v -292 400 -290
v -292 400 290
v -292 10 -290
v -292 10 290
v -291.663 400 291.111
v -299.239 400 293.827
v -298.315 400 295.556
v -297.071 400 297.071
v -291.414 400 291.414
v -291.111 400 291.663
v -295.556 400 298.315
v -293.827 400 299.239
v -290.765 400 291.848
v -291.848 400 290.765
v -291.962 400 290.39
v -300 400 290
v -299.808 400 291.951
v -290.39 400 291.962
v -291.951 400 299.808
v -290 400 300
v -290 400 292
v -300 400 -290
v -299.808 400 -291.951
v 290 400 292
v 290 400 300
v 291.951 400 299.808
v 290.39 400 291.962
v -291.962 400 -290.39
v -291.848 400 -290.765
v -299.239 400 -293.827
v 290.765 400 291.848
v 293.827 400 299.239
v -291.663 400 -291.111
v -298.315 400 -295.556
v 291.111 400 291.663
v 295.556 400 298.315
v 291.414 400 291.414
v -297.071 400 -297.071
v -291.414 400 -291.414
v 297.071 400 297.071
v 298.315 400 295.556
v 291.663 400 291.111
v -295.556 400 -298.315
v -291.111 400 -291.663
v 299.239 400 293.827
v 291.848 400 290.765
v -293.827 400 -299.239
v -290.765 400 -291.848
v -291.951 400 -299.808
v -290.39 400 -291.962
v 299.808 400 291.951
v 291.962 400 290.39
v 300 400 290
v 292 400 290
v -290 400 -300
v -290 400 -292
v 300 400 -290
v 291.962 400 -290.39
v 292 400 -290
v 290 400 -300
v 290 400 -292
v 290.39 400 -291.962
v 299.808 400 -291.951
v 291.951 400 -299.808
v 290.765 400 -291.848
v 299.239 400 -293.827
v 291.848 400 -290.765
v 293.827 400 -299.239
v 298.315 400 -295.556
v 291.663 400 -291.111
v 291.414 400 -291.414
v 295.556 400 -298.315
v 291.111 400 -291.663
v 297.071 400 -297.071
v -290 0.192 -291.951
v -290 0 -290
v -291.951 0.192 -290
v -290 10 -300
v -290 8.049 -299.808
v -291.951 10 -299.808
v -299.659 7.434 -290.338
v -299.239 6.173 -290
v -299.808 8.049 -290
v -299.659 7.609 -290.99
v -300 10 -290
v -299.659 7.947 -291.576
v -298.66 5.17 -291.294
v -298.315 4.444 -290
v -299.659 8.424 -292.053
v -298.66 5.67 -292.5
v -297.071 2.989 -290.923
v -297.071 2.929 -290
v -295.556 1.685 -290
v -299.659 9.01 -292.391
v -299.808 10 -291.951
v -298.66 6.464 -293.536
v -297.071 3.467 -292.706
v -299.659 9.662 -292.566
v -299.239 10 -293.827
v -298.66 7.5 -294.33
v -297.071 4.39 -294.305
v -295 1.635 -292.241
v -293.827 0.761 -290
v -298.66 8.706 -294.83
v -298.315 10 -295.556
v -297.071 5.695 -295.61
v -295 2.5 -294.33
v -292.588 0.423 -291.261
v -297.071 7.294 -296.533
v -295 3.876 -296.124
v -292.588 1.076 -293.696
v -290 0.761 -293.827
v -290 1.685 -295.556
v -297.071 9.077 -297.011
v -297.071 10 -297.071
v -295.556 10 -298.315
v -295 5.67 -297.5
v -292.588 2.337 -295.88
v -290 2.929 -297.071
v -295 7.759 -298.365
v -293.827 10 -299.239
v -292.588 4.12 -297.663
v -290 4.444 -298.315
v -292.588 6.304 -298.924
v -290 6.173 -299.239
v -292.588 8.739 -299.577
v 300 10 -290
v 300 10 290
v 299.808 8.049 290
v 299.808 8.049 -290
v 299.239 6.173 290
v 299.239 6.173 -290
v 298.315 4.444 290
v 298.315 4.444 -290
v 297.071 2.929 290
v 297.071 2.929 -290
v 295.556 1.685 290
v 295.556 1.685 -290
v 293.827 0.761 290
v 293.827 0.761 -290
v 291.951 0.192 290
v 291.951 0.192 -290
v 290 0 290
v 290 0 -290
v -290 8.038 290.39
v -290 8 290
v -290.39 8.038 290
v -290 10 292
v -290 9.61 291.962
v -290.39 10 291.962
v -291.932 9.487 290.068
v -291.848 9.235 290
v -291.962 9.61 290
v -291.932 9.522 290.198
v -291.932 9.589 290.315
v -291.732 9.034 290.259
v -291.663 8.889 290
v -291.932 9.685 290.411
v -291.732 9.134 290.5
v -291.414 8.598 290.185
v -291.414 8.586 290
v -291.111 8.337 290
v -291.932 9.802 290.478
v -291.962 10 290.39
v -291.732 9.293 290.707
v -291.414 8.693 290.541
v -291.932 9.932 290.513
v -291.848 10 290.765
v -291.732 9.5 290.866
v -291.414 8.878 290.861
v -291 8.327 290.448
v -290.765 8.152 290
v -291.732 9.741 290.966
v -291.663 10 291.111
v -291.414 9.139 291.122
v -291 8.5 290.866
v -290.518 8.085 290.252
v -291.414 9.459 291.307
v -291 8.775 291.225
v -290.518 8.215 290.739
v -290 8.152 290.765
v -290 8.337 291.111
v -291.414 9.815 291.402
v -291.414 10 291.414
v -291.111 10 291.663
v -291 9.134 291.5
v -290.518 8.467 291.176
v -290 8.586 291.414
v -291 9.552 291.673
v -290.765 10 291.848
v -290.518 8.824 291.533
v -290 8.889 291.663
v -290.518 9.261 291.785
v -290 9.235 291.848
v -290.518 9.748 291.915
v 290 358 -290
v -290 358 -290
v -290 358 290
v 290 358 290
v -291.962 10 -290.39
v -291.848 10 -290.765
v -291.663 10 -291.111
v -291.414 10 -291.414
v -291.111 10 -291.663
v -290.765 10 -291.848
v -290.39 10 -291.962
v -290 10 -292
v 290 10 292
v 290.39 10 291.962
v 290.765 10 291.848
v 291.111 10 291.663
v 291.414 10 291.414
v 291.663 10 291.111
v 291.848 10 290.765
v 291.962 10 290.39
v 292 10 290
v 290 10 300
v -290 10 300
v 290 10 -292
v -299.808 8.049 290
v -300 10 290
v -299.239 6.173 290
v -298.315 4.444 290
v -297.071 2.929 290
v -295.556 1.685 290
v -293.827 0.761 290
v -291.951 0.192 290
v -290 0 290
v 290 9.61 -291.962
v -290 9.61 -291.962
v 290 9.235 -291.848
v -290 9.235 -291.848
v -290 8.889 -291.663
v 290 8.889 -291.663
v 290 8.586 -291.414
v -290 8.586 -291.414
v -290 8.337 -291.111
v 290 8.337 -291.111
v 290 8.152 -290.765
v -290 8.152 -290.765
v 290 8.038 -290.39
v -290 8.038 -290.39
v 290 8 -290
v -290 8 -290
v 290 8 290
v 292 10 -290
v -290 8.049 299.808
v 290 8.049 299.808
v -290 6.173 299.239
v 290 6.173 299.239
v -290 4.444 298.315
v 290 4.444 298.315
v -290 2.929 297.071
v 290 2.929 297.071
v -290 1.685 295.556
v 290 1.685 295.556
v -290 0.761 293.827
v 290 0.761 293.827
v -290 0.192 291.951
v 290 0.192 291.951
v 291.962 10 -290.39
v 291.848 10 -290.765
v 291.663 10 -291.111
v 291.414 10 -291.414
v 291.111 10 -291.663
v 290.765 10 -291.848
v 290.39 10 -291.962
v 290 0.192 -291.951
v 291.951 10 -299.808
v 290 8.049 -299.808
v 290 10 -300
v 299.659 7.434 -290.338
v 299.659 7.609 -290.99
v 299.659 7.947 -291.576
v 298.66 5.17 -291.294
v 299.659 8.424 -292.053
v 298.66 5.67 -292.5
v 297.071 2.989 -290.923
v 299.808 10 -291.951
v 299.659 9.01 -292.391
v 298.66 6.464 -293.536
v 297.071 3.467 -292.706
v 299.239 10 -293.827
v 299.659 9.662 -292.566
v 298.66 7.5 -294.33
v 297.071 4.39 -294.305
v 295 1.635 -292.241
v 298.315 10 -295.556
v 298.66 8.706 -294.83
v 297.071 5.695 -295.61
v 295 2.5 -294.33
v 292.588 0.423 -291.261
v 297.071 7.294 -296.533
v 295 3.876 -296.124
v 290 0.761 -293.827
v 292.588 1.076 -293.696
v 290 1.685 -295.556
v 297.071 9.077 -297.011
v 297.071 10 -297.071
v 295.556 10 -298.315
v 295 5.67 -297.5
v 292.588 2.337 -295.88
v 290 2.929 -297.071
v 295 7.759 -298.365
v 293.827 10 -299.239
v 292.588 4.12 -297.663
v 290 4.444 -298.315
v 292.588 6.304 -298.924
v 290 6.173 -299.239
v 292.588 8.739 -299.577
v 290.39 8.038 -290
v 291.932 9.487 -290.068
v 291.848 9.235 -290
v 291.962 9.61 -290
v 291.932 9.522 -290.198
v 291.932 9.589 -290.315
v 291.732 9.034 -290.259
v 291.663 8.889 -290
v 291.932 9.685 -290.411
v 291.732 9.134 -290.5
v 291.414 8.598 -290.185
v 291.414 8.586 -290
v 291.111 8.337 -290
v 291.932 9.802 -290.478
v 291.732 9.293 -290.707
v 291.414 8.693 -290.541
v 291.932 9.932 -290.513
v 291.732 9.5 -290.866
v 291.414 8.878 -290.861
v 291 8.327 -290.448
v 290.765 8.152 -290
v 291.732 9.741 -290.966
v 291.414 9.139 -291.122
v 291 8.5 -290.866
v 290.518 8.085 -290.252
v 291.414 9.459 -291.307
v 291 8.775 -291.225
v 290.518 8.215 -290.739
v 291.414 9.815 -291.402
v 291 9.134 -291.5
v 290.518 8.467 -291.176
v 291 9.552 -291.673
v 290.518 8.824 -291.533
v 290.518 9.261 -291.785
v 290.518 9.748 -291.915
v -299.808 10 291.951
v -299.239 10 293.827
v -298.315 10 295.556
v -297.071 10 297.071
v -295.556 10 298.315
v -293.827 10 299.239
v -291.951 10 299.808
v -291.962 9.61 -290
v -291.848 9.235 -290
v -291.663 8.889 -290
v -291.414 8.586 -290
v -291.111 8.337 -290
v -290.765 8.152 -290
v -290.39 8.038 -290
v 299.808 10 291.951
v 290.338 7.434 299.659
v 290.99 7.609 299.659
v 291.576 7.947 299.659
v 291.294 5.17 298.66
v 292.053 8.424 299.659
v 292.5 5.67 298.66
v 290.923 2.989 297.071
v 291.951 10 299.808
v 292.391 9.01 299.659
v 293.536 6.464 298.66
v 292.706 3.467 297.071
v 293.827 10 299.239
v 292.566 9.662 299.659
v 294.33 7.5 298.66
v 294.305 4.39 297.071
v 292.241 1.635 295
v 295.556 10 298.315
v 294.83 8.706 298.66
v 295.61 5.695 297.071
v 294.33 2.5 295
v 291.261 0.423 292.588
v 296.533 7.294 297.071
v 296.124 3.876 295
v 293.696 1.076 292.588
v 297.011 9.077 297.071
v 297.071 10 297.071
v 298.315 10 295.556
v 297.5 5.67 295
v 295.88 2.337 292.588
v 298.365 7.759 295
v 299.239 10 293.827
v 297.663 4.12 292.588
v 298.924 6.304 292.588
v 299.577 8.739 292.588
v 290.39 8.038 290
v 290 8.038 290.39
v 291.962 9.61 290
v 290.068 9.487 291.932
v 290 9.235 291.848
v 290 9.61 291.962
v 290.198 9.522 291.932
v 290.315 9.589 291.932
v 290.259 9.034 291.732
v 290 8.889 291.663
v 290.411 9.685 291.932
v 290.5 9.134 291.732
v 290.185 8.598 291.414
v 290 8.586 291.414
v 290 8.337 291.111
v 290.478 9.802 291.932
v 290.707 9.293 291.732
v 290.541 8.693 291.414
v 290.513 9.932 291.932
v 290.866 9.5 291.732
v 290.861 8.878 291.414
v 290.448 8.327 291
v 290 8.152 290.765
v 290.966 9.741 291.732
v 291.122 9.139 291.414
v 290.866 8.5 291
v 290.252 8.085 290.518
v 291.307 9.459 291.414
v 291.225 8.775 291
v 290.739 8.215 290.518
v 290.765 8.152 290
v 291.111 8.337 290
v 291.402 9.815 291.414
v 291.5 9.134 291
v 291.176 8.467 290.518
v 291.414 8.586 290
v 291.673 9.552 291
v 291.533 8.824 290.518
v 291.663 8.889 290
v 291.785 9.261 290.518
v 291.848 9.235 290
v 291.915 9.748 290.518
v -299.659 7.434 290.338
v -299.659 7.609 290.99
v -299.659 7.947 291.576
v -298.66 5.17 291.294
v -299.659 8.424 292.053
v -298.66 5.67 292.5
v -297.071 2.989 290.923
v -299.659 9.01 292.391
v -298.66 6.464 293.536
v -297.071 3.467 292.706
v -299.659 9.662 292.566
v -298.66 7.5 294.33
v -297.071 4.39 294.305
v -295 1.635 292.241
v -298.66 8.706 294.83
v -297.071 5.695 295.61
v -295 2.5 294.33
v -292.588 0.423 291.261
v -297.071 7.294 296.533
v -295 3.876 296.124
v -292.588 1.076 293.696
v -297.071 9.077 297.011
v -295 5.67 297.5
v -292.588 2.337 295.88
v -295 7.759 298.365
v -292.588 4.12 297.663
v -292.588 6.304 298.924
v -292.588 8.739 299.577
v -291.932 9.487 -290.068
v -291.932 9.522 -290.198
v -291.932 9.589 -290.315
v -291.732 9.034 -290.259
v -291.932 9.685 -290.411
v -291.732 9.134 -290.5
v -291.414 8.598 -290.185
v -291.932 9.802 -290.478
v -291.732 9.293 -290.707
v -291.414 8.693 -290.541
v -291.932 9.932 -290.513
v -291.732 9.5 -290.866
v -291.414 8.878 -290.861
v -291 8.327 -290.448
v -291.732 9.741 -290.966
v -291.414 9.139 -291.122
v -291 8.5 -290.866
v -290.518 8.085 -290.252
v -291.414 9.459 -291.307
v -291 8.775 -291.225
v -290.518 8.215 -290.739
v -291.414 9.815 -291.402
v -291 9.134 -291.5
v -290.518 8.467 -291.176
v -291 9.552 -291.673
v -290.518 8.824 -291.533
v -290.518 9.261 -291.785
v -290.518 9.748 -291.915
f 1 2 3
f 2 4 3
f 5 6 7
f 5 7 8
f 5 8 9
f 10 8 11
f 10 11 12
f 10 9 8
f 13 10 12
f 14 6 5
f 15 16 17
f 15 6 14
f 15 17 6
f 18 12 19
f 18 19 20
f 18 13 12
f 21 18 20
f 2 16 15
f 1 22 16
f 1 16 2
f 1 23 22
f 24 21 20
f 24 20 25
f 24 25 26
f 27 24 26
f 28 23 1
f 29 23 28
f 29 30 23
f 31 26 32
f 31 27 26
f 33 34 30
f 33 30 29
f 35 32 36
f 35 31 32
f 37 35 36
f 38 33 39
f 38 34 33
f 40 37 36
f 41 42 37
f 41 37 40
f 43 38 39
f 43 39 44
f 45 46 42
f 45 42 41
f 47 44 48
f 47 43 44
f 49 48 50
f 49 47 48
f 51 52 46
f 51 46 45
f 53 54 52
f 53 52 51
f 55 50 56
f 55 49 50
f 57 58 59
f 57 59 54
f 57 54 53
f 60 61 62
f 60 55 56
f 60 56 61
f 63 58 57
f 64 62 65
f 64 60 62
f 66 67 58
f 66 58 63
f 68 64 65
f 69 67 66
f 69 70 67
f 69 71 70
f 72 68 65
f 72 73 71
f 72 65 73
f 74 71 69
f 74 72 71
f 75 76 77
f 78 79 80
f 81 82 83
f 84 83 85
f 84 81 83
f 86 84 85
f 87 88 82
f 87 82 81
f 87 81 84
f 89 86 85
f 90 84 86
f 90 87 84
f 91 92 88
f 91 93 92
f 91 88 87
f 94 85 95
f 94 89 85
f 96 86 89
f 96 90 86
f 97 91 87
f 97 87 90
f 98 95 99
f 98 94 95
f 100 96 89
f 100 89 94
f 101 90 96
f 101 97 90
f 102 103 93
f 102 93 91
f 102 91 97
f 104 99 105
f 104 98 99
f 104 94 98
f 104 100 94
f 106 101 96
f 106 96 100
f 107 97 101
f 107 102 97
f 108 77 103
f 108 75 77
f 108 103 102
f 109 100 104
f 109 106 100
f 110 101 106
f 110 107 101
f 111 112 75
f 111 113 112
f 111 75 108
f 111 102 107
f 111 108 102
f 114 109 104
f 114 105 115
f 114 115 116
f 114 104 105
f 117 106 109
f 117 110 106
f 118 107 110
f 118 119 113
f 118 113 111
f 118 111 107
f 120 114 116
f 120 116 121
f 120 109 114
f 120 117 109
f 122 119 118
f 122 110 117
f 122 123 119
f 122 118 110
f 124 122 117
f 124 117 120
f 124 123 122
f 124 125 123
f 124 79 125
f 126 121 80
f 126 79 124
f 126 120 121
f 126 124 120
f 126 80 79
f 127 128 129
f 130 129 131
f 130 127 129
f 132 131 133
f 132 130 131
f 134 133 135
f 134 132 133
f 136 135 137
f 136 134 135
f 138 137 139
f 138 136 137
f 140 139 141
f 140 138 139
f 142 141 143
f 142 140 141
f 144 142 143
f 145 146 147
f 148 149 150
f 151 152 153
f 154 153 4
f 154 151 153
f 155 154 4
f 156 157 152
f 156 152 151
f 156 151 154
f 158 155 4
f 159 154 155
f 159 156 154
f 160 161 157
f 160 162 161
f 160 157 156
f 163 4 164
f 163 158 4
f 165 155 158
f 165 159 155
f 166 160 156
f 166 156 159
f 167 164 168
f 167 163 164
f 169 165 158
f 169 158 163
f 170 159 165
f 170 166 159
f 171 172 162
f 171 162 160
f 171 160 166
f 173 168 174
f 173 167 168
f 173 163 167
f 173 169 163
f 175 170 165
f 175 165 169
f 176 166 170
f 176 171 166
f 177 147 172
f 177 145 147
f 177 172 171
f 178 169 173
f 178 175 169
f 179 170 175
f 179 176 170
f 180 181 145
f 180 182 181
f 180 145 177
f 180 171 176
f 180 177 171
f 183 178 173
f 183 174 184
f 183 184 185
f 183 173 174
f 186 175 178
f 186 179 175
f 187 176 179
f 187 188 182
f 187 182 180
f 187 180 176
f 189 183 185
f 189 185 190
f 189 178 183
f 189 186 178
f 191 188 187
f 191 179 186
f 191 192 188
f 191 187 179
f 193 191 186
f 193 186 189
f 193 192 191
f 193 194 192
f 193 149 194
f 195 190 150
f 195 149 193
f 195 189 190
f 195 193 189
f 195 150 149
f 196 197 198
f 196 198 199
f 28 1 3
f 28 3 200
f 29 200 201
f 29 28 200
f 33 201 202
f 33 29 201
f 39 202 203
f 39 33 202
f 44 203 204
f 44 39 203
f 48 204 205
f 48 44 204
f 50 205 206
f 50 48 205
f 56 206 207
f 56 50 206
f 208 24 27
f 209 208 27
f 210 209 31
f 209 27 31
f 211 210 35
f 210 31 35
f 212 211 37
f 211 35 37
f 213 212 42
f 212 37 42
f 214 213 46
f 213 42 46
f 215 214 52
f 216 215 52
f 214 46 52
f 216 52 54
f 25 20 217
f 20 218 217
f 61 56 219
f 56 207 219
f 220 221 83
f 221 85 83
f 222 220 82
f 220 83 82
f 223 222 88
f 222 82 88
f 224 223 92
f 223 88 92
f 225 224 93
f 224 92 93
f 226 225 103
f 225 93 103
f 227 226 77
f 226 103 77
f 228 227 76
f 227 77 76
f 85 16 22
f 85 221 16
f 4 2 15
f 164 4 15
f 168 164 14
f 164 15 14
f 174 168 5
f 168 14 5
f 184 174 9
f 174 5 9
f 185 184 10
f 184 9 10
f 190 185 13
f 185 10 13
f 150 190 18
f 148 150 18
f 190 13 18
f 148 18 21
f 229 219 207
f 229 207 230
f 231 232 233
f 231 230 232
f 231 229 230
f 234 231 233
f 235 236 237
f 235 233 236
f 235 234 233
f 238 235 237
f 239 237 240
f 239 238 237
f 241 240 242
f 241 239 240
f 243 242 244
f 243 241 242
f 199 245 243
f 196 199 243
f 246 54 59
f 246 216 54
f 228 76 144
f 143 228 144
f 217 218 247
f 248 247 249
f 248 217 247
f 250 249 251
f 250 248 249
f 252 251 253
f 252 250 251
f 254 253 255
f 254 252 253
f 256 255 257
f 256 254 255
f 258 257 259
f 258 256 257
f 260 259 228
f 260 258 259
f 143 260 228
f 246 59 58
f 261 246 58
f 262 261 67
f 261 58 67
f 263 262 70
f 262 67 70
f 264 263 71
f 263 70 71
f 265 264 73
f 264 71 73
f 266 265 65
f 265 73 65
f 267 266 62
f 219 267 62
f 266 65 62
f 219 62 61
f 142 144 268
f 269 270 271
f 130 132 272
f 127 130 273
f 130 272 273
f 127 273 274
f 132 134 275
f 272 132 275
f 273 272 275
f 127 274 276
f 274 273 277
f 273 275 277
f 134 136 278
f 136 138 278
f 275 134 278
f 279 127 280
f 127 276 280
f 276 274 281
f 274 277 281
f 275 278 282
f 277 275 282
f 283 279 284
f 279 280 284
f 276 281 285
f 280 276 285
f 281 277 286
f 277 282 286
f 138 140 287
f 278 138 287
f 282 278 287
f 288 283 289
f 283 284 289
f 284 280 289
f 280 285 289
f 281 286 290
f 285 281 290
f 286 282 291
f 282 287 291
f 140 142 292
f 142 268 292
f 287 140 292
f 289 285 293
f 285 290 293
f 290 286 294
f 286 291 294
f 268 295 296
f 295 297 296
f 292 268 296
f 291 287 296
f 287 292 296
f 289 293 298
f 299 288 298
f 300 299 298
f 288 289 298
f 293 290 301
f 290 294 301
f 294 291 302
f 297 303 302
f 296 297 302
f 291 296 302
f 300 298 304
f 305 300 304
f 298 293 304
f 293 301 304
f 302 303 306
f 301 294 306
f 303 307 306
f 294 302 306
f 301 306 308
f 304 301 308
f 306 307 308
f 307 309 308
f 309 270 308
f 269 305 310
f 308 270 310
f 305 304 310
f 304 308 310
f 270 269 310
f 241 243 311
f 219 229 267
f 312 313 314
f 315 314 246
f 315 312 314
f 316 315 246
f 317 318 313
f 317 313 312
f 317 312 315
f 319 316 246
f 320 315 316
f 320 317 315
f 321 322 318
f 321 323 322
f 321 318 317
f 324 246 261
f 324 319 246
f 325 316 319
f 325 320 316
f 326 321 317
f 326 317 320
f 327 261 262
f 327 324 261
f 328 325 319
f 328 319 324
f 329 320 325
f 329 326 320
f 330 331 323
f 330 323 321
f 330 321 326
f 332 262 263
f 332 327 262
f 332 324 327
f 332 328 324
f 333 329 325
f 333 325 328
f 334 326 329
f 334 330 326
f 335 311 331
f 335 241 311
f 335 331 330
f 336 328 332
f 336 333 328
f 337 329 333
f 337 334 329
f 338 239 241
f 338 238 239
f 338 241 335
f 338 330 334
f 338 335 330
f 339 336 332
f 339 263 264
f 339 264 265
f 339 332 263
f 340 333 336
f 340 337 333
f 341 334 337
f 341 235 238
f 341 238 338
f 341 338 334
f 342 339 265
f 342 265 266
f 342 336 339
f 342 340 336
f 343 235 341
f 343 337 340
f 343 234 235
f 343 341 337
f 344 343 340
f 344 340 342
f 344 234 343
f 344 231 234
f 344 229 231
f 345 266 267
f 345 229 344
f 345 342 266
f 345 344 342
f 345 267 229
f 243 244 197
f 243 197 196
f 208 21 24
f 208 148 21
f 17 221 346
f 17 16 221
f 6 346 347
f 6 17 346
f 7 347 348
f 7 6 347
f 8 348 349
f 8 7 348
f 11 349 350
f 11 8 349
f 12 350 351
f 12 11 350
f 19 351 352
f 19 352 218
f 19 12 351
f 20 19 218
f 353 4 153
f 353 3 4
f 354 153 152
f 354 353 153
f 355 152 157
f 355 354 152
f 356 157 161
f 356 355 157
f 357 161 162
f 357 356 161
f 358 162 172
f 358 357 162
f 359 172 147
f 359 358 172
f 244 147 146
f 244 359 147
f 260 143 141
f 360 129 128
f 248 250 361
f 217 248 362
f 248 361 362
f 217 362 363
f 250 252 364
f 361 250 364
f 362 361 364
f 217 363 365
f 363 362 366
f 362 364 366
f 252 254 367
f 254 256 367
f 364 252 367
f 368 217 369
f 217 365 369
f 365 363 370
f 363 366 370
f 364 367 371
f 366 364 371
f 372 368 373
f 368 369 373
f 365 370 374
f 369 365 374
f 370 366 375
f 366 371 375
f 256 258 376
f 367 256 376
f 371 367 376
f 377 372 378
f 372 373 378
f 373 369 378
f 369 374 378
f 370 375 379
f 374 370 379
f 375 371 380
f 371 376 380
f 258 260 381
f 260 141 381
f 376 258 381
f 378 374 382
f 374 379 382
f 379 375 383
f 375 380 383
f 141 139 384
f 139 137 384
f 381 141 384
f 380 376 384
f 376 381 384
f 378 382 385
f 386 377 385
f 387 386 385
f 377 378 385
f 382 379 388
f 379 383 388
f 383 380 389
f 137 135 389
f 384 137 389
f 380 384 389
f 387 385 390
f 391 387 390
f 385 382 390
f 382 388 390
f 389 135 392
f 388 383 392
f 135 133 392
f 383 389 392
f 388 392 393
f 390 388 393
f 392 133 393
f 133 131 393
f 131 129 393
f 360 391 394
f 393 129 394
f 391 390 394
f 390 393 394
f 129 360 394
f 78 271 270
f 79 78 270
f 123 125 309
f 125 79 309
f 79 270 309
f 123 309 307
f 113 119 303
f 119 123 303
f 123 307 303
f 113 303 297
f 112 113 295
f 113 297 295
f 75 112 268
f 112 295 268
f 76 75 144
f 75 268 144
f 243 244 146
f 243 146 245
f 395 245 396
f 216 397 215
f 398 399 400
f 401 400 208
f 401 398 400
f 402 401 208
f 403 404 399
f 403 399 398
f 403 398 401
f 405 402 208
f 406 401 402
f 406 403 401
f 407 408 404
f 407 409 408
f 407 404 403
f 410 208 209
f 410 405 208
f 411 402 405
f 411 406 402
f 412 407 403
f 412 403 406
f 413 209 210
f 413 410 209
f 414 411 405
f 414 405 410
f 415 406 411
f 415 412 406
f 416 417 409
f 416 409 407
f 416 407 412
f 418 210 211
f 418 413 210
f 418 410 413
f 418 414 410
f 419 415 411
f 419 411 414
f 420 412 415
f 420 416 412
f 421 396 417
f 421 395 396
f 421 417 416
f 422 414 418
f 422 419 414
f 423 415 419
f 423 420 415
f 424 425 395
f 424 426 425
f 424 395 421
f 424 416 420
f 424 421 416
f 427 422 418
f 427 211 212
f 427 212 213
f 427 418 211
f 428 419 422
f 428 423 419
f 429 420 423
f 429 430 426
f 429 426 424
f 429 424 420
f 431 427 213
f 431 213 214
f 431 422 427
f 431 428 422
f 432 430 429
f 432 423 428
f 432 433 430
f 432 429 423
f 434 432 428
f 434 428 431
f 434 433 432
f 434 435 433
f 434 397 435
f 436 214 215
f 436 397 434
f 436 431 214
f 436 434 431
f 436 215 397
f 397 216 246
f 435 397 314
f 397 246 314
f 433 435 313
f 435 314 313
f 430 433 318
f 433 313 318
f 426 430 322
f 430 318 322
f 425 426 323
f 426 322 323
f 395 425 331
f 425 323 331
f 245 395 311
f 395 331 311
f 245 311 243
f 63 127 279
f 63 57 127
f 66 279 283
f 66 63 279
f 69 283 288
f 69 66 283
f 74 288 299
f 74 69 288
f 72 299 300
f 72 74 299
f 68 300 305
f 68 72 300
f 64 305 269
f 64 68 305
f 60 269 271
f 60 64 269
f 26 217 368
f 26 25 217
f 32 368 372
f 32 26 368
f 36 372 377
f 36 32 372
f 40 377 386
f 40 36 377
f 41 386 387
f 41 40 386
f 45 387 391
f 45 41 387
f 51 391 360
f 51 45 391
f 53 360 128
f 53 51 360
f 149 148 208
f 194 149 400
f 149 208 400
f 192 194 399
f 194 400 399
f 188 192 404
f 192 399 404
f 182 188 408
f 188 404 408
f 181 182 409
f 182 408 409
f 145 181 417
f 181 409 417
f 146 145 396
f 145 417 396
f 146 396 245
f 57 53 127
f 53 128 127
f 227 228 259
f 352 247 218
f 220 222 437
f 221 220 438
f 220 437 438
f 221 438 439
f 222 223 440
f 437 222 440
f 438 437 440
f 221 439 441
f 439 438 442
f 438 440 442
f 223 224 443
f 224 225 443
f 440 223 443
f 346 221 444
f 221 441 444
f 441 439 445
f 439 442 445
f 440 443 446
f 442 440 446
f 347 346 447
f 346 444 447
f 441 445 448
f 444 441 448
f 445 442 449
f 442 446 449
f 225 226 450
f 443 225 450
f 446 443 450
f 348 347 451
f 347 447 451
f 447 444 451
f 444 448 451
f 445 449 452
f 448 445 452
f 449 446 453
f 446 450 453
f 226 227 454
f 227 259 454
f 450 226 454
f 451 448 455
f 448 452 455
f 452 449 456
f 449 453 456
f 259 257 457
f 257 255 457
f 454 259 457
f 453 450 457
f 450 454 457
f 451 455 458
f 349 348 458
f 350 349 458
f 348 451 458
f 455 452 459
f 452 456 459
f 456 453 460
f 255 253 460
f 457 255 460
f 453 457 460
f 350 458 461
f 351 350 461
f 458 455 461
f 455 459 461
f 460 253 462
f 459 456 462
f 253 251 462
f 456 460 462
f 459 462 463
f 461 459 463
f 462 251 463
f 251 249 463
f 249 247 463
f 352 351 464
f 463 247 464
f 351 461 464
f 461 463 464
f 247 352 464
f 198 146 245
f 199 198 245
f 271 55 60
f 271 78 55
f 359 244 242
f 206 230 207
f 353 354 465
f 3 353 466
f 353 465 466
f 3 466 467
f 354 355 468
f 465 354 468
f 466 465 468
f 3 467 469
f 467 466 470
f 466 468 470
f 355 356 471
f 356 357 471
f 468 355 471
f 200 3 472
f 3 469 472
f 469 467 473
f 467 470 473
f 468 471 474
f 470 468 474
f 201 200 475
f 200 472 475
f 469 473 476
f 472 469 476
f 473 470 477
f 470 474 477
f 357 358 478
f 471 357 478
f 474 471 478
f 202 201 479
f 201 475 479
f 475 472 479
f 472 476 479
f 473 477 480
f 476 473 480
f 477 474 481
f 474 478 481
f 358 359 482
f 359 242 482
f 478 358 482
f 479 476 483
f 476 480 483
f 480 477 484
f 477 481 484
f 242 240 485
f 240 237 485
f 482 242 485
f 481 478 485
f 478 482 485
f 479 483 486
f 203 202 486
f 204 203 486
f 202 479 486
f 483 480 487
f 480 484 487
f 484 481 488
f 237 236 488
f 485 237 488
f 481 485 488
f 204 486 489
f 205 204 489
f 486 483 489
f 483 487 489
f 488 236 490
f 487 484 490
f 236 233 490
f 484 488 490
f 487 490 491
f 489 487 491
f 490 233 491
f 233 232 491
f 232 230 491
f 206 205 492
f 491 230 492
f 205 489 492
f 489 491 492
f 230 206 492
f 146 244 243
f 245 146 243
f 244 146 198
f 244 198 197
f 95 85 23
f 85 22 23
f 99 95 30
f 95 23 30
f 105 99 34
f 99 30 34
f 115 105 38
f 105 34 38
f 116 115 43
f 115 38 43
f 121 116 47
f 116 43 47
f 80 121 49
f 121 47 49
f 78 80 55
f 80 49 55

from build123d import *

# Parameters (mm, degrees)
CROQUIS1_W     = 600
CROQUIS1_H     = 600
EXTRUIR1_DEPTH = 400
REDONDEO1_R    = 10
VACIADO1_T     = -8
CROQUIS2_W     = 580
CROQUIS2_H     = 580
EXTRUIR2_DEPTH = 350


with BuildPart() as part:
    # Croquis1 → Extruir1 (new body)
    with BuildSketch(Plane(origin=(0, 0, 0), x_dir=(1, 0, 0), z_dir=(0, 1, 0))):
        Rectangle(CROQUIS1_W, CROQUIS1_H)
    extrude(amount=EXTRUIR1_DEPTH)

    # Redondeo1
    redondeo1_edges = [part.edges().sort_by_distance(p)[0] for p in [
        (0, 0, -300),
        (300, 0, 0),
        (0, 0, 300),
        (-300, 0, 0),
        (-300, 200, -300),
        (300, 200, -300),
        (300, 200, 300),
        (-300, 200, 300),
    ]]
    fillet(redondeo1_edges, radius=REDONDEO1_R)

    # Vaciado1
    vaciado1_openings = [part.faces().sort_by_distance(p)[0] for p in [
        (0, 400, 0),
    ]]
    offset(amount=VACIADO1_T, openings=vaciado1_openings, kind=Kind.INTERSECTION)


with BuildPart() as body_2:
    # Croquis2 → Extruir2 (new body)
    with BuildSketch(Plane(origin=(0, 8, 0), x_dir=(1, 0, 0), z_dir=(0, 1, 0))):
        Rectangle(CROQUIS2_W, CROQUIS2_H)
    extrude(amount=EXTRUIR2_DEPTH)


solid = Compound([part.part, body_2.part])
